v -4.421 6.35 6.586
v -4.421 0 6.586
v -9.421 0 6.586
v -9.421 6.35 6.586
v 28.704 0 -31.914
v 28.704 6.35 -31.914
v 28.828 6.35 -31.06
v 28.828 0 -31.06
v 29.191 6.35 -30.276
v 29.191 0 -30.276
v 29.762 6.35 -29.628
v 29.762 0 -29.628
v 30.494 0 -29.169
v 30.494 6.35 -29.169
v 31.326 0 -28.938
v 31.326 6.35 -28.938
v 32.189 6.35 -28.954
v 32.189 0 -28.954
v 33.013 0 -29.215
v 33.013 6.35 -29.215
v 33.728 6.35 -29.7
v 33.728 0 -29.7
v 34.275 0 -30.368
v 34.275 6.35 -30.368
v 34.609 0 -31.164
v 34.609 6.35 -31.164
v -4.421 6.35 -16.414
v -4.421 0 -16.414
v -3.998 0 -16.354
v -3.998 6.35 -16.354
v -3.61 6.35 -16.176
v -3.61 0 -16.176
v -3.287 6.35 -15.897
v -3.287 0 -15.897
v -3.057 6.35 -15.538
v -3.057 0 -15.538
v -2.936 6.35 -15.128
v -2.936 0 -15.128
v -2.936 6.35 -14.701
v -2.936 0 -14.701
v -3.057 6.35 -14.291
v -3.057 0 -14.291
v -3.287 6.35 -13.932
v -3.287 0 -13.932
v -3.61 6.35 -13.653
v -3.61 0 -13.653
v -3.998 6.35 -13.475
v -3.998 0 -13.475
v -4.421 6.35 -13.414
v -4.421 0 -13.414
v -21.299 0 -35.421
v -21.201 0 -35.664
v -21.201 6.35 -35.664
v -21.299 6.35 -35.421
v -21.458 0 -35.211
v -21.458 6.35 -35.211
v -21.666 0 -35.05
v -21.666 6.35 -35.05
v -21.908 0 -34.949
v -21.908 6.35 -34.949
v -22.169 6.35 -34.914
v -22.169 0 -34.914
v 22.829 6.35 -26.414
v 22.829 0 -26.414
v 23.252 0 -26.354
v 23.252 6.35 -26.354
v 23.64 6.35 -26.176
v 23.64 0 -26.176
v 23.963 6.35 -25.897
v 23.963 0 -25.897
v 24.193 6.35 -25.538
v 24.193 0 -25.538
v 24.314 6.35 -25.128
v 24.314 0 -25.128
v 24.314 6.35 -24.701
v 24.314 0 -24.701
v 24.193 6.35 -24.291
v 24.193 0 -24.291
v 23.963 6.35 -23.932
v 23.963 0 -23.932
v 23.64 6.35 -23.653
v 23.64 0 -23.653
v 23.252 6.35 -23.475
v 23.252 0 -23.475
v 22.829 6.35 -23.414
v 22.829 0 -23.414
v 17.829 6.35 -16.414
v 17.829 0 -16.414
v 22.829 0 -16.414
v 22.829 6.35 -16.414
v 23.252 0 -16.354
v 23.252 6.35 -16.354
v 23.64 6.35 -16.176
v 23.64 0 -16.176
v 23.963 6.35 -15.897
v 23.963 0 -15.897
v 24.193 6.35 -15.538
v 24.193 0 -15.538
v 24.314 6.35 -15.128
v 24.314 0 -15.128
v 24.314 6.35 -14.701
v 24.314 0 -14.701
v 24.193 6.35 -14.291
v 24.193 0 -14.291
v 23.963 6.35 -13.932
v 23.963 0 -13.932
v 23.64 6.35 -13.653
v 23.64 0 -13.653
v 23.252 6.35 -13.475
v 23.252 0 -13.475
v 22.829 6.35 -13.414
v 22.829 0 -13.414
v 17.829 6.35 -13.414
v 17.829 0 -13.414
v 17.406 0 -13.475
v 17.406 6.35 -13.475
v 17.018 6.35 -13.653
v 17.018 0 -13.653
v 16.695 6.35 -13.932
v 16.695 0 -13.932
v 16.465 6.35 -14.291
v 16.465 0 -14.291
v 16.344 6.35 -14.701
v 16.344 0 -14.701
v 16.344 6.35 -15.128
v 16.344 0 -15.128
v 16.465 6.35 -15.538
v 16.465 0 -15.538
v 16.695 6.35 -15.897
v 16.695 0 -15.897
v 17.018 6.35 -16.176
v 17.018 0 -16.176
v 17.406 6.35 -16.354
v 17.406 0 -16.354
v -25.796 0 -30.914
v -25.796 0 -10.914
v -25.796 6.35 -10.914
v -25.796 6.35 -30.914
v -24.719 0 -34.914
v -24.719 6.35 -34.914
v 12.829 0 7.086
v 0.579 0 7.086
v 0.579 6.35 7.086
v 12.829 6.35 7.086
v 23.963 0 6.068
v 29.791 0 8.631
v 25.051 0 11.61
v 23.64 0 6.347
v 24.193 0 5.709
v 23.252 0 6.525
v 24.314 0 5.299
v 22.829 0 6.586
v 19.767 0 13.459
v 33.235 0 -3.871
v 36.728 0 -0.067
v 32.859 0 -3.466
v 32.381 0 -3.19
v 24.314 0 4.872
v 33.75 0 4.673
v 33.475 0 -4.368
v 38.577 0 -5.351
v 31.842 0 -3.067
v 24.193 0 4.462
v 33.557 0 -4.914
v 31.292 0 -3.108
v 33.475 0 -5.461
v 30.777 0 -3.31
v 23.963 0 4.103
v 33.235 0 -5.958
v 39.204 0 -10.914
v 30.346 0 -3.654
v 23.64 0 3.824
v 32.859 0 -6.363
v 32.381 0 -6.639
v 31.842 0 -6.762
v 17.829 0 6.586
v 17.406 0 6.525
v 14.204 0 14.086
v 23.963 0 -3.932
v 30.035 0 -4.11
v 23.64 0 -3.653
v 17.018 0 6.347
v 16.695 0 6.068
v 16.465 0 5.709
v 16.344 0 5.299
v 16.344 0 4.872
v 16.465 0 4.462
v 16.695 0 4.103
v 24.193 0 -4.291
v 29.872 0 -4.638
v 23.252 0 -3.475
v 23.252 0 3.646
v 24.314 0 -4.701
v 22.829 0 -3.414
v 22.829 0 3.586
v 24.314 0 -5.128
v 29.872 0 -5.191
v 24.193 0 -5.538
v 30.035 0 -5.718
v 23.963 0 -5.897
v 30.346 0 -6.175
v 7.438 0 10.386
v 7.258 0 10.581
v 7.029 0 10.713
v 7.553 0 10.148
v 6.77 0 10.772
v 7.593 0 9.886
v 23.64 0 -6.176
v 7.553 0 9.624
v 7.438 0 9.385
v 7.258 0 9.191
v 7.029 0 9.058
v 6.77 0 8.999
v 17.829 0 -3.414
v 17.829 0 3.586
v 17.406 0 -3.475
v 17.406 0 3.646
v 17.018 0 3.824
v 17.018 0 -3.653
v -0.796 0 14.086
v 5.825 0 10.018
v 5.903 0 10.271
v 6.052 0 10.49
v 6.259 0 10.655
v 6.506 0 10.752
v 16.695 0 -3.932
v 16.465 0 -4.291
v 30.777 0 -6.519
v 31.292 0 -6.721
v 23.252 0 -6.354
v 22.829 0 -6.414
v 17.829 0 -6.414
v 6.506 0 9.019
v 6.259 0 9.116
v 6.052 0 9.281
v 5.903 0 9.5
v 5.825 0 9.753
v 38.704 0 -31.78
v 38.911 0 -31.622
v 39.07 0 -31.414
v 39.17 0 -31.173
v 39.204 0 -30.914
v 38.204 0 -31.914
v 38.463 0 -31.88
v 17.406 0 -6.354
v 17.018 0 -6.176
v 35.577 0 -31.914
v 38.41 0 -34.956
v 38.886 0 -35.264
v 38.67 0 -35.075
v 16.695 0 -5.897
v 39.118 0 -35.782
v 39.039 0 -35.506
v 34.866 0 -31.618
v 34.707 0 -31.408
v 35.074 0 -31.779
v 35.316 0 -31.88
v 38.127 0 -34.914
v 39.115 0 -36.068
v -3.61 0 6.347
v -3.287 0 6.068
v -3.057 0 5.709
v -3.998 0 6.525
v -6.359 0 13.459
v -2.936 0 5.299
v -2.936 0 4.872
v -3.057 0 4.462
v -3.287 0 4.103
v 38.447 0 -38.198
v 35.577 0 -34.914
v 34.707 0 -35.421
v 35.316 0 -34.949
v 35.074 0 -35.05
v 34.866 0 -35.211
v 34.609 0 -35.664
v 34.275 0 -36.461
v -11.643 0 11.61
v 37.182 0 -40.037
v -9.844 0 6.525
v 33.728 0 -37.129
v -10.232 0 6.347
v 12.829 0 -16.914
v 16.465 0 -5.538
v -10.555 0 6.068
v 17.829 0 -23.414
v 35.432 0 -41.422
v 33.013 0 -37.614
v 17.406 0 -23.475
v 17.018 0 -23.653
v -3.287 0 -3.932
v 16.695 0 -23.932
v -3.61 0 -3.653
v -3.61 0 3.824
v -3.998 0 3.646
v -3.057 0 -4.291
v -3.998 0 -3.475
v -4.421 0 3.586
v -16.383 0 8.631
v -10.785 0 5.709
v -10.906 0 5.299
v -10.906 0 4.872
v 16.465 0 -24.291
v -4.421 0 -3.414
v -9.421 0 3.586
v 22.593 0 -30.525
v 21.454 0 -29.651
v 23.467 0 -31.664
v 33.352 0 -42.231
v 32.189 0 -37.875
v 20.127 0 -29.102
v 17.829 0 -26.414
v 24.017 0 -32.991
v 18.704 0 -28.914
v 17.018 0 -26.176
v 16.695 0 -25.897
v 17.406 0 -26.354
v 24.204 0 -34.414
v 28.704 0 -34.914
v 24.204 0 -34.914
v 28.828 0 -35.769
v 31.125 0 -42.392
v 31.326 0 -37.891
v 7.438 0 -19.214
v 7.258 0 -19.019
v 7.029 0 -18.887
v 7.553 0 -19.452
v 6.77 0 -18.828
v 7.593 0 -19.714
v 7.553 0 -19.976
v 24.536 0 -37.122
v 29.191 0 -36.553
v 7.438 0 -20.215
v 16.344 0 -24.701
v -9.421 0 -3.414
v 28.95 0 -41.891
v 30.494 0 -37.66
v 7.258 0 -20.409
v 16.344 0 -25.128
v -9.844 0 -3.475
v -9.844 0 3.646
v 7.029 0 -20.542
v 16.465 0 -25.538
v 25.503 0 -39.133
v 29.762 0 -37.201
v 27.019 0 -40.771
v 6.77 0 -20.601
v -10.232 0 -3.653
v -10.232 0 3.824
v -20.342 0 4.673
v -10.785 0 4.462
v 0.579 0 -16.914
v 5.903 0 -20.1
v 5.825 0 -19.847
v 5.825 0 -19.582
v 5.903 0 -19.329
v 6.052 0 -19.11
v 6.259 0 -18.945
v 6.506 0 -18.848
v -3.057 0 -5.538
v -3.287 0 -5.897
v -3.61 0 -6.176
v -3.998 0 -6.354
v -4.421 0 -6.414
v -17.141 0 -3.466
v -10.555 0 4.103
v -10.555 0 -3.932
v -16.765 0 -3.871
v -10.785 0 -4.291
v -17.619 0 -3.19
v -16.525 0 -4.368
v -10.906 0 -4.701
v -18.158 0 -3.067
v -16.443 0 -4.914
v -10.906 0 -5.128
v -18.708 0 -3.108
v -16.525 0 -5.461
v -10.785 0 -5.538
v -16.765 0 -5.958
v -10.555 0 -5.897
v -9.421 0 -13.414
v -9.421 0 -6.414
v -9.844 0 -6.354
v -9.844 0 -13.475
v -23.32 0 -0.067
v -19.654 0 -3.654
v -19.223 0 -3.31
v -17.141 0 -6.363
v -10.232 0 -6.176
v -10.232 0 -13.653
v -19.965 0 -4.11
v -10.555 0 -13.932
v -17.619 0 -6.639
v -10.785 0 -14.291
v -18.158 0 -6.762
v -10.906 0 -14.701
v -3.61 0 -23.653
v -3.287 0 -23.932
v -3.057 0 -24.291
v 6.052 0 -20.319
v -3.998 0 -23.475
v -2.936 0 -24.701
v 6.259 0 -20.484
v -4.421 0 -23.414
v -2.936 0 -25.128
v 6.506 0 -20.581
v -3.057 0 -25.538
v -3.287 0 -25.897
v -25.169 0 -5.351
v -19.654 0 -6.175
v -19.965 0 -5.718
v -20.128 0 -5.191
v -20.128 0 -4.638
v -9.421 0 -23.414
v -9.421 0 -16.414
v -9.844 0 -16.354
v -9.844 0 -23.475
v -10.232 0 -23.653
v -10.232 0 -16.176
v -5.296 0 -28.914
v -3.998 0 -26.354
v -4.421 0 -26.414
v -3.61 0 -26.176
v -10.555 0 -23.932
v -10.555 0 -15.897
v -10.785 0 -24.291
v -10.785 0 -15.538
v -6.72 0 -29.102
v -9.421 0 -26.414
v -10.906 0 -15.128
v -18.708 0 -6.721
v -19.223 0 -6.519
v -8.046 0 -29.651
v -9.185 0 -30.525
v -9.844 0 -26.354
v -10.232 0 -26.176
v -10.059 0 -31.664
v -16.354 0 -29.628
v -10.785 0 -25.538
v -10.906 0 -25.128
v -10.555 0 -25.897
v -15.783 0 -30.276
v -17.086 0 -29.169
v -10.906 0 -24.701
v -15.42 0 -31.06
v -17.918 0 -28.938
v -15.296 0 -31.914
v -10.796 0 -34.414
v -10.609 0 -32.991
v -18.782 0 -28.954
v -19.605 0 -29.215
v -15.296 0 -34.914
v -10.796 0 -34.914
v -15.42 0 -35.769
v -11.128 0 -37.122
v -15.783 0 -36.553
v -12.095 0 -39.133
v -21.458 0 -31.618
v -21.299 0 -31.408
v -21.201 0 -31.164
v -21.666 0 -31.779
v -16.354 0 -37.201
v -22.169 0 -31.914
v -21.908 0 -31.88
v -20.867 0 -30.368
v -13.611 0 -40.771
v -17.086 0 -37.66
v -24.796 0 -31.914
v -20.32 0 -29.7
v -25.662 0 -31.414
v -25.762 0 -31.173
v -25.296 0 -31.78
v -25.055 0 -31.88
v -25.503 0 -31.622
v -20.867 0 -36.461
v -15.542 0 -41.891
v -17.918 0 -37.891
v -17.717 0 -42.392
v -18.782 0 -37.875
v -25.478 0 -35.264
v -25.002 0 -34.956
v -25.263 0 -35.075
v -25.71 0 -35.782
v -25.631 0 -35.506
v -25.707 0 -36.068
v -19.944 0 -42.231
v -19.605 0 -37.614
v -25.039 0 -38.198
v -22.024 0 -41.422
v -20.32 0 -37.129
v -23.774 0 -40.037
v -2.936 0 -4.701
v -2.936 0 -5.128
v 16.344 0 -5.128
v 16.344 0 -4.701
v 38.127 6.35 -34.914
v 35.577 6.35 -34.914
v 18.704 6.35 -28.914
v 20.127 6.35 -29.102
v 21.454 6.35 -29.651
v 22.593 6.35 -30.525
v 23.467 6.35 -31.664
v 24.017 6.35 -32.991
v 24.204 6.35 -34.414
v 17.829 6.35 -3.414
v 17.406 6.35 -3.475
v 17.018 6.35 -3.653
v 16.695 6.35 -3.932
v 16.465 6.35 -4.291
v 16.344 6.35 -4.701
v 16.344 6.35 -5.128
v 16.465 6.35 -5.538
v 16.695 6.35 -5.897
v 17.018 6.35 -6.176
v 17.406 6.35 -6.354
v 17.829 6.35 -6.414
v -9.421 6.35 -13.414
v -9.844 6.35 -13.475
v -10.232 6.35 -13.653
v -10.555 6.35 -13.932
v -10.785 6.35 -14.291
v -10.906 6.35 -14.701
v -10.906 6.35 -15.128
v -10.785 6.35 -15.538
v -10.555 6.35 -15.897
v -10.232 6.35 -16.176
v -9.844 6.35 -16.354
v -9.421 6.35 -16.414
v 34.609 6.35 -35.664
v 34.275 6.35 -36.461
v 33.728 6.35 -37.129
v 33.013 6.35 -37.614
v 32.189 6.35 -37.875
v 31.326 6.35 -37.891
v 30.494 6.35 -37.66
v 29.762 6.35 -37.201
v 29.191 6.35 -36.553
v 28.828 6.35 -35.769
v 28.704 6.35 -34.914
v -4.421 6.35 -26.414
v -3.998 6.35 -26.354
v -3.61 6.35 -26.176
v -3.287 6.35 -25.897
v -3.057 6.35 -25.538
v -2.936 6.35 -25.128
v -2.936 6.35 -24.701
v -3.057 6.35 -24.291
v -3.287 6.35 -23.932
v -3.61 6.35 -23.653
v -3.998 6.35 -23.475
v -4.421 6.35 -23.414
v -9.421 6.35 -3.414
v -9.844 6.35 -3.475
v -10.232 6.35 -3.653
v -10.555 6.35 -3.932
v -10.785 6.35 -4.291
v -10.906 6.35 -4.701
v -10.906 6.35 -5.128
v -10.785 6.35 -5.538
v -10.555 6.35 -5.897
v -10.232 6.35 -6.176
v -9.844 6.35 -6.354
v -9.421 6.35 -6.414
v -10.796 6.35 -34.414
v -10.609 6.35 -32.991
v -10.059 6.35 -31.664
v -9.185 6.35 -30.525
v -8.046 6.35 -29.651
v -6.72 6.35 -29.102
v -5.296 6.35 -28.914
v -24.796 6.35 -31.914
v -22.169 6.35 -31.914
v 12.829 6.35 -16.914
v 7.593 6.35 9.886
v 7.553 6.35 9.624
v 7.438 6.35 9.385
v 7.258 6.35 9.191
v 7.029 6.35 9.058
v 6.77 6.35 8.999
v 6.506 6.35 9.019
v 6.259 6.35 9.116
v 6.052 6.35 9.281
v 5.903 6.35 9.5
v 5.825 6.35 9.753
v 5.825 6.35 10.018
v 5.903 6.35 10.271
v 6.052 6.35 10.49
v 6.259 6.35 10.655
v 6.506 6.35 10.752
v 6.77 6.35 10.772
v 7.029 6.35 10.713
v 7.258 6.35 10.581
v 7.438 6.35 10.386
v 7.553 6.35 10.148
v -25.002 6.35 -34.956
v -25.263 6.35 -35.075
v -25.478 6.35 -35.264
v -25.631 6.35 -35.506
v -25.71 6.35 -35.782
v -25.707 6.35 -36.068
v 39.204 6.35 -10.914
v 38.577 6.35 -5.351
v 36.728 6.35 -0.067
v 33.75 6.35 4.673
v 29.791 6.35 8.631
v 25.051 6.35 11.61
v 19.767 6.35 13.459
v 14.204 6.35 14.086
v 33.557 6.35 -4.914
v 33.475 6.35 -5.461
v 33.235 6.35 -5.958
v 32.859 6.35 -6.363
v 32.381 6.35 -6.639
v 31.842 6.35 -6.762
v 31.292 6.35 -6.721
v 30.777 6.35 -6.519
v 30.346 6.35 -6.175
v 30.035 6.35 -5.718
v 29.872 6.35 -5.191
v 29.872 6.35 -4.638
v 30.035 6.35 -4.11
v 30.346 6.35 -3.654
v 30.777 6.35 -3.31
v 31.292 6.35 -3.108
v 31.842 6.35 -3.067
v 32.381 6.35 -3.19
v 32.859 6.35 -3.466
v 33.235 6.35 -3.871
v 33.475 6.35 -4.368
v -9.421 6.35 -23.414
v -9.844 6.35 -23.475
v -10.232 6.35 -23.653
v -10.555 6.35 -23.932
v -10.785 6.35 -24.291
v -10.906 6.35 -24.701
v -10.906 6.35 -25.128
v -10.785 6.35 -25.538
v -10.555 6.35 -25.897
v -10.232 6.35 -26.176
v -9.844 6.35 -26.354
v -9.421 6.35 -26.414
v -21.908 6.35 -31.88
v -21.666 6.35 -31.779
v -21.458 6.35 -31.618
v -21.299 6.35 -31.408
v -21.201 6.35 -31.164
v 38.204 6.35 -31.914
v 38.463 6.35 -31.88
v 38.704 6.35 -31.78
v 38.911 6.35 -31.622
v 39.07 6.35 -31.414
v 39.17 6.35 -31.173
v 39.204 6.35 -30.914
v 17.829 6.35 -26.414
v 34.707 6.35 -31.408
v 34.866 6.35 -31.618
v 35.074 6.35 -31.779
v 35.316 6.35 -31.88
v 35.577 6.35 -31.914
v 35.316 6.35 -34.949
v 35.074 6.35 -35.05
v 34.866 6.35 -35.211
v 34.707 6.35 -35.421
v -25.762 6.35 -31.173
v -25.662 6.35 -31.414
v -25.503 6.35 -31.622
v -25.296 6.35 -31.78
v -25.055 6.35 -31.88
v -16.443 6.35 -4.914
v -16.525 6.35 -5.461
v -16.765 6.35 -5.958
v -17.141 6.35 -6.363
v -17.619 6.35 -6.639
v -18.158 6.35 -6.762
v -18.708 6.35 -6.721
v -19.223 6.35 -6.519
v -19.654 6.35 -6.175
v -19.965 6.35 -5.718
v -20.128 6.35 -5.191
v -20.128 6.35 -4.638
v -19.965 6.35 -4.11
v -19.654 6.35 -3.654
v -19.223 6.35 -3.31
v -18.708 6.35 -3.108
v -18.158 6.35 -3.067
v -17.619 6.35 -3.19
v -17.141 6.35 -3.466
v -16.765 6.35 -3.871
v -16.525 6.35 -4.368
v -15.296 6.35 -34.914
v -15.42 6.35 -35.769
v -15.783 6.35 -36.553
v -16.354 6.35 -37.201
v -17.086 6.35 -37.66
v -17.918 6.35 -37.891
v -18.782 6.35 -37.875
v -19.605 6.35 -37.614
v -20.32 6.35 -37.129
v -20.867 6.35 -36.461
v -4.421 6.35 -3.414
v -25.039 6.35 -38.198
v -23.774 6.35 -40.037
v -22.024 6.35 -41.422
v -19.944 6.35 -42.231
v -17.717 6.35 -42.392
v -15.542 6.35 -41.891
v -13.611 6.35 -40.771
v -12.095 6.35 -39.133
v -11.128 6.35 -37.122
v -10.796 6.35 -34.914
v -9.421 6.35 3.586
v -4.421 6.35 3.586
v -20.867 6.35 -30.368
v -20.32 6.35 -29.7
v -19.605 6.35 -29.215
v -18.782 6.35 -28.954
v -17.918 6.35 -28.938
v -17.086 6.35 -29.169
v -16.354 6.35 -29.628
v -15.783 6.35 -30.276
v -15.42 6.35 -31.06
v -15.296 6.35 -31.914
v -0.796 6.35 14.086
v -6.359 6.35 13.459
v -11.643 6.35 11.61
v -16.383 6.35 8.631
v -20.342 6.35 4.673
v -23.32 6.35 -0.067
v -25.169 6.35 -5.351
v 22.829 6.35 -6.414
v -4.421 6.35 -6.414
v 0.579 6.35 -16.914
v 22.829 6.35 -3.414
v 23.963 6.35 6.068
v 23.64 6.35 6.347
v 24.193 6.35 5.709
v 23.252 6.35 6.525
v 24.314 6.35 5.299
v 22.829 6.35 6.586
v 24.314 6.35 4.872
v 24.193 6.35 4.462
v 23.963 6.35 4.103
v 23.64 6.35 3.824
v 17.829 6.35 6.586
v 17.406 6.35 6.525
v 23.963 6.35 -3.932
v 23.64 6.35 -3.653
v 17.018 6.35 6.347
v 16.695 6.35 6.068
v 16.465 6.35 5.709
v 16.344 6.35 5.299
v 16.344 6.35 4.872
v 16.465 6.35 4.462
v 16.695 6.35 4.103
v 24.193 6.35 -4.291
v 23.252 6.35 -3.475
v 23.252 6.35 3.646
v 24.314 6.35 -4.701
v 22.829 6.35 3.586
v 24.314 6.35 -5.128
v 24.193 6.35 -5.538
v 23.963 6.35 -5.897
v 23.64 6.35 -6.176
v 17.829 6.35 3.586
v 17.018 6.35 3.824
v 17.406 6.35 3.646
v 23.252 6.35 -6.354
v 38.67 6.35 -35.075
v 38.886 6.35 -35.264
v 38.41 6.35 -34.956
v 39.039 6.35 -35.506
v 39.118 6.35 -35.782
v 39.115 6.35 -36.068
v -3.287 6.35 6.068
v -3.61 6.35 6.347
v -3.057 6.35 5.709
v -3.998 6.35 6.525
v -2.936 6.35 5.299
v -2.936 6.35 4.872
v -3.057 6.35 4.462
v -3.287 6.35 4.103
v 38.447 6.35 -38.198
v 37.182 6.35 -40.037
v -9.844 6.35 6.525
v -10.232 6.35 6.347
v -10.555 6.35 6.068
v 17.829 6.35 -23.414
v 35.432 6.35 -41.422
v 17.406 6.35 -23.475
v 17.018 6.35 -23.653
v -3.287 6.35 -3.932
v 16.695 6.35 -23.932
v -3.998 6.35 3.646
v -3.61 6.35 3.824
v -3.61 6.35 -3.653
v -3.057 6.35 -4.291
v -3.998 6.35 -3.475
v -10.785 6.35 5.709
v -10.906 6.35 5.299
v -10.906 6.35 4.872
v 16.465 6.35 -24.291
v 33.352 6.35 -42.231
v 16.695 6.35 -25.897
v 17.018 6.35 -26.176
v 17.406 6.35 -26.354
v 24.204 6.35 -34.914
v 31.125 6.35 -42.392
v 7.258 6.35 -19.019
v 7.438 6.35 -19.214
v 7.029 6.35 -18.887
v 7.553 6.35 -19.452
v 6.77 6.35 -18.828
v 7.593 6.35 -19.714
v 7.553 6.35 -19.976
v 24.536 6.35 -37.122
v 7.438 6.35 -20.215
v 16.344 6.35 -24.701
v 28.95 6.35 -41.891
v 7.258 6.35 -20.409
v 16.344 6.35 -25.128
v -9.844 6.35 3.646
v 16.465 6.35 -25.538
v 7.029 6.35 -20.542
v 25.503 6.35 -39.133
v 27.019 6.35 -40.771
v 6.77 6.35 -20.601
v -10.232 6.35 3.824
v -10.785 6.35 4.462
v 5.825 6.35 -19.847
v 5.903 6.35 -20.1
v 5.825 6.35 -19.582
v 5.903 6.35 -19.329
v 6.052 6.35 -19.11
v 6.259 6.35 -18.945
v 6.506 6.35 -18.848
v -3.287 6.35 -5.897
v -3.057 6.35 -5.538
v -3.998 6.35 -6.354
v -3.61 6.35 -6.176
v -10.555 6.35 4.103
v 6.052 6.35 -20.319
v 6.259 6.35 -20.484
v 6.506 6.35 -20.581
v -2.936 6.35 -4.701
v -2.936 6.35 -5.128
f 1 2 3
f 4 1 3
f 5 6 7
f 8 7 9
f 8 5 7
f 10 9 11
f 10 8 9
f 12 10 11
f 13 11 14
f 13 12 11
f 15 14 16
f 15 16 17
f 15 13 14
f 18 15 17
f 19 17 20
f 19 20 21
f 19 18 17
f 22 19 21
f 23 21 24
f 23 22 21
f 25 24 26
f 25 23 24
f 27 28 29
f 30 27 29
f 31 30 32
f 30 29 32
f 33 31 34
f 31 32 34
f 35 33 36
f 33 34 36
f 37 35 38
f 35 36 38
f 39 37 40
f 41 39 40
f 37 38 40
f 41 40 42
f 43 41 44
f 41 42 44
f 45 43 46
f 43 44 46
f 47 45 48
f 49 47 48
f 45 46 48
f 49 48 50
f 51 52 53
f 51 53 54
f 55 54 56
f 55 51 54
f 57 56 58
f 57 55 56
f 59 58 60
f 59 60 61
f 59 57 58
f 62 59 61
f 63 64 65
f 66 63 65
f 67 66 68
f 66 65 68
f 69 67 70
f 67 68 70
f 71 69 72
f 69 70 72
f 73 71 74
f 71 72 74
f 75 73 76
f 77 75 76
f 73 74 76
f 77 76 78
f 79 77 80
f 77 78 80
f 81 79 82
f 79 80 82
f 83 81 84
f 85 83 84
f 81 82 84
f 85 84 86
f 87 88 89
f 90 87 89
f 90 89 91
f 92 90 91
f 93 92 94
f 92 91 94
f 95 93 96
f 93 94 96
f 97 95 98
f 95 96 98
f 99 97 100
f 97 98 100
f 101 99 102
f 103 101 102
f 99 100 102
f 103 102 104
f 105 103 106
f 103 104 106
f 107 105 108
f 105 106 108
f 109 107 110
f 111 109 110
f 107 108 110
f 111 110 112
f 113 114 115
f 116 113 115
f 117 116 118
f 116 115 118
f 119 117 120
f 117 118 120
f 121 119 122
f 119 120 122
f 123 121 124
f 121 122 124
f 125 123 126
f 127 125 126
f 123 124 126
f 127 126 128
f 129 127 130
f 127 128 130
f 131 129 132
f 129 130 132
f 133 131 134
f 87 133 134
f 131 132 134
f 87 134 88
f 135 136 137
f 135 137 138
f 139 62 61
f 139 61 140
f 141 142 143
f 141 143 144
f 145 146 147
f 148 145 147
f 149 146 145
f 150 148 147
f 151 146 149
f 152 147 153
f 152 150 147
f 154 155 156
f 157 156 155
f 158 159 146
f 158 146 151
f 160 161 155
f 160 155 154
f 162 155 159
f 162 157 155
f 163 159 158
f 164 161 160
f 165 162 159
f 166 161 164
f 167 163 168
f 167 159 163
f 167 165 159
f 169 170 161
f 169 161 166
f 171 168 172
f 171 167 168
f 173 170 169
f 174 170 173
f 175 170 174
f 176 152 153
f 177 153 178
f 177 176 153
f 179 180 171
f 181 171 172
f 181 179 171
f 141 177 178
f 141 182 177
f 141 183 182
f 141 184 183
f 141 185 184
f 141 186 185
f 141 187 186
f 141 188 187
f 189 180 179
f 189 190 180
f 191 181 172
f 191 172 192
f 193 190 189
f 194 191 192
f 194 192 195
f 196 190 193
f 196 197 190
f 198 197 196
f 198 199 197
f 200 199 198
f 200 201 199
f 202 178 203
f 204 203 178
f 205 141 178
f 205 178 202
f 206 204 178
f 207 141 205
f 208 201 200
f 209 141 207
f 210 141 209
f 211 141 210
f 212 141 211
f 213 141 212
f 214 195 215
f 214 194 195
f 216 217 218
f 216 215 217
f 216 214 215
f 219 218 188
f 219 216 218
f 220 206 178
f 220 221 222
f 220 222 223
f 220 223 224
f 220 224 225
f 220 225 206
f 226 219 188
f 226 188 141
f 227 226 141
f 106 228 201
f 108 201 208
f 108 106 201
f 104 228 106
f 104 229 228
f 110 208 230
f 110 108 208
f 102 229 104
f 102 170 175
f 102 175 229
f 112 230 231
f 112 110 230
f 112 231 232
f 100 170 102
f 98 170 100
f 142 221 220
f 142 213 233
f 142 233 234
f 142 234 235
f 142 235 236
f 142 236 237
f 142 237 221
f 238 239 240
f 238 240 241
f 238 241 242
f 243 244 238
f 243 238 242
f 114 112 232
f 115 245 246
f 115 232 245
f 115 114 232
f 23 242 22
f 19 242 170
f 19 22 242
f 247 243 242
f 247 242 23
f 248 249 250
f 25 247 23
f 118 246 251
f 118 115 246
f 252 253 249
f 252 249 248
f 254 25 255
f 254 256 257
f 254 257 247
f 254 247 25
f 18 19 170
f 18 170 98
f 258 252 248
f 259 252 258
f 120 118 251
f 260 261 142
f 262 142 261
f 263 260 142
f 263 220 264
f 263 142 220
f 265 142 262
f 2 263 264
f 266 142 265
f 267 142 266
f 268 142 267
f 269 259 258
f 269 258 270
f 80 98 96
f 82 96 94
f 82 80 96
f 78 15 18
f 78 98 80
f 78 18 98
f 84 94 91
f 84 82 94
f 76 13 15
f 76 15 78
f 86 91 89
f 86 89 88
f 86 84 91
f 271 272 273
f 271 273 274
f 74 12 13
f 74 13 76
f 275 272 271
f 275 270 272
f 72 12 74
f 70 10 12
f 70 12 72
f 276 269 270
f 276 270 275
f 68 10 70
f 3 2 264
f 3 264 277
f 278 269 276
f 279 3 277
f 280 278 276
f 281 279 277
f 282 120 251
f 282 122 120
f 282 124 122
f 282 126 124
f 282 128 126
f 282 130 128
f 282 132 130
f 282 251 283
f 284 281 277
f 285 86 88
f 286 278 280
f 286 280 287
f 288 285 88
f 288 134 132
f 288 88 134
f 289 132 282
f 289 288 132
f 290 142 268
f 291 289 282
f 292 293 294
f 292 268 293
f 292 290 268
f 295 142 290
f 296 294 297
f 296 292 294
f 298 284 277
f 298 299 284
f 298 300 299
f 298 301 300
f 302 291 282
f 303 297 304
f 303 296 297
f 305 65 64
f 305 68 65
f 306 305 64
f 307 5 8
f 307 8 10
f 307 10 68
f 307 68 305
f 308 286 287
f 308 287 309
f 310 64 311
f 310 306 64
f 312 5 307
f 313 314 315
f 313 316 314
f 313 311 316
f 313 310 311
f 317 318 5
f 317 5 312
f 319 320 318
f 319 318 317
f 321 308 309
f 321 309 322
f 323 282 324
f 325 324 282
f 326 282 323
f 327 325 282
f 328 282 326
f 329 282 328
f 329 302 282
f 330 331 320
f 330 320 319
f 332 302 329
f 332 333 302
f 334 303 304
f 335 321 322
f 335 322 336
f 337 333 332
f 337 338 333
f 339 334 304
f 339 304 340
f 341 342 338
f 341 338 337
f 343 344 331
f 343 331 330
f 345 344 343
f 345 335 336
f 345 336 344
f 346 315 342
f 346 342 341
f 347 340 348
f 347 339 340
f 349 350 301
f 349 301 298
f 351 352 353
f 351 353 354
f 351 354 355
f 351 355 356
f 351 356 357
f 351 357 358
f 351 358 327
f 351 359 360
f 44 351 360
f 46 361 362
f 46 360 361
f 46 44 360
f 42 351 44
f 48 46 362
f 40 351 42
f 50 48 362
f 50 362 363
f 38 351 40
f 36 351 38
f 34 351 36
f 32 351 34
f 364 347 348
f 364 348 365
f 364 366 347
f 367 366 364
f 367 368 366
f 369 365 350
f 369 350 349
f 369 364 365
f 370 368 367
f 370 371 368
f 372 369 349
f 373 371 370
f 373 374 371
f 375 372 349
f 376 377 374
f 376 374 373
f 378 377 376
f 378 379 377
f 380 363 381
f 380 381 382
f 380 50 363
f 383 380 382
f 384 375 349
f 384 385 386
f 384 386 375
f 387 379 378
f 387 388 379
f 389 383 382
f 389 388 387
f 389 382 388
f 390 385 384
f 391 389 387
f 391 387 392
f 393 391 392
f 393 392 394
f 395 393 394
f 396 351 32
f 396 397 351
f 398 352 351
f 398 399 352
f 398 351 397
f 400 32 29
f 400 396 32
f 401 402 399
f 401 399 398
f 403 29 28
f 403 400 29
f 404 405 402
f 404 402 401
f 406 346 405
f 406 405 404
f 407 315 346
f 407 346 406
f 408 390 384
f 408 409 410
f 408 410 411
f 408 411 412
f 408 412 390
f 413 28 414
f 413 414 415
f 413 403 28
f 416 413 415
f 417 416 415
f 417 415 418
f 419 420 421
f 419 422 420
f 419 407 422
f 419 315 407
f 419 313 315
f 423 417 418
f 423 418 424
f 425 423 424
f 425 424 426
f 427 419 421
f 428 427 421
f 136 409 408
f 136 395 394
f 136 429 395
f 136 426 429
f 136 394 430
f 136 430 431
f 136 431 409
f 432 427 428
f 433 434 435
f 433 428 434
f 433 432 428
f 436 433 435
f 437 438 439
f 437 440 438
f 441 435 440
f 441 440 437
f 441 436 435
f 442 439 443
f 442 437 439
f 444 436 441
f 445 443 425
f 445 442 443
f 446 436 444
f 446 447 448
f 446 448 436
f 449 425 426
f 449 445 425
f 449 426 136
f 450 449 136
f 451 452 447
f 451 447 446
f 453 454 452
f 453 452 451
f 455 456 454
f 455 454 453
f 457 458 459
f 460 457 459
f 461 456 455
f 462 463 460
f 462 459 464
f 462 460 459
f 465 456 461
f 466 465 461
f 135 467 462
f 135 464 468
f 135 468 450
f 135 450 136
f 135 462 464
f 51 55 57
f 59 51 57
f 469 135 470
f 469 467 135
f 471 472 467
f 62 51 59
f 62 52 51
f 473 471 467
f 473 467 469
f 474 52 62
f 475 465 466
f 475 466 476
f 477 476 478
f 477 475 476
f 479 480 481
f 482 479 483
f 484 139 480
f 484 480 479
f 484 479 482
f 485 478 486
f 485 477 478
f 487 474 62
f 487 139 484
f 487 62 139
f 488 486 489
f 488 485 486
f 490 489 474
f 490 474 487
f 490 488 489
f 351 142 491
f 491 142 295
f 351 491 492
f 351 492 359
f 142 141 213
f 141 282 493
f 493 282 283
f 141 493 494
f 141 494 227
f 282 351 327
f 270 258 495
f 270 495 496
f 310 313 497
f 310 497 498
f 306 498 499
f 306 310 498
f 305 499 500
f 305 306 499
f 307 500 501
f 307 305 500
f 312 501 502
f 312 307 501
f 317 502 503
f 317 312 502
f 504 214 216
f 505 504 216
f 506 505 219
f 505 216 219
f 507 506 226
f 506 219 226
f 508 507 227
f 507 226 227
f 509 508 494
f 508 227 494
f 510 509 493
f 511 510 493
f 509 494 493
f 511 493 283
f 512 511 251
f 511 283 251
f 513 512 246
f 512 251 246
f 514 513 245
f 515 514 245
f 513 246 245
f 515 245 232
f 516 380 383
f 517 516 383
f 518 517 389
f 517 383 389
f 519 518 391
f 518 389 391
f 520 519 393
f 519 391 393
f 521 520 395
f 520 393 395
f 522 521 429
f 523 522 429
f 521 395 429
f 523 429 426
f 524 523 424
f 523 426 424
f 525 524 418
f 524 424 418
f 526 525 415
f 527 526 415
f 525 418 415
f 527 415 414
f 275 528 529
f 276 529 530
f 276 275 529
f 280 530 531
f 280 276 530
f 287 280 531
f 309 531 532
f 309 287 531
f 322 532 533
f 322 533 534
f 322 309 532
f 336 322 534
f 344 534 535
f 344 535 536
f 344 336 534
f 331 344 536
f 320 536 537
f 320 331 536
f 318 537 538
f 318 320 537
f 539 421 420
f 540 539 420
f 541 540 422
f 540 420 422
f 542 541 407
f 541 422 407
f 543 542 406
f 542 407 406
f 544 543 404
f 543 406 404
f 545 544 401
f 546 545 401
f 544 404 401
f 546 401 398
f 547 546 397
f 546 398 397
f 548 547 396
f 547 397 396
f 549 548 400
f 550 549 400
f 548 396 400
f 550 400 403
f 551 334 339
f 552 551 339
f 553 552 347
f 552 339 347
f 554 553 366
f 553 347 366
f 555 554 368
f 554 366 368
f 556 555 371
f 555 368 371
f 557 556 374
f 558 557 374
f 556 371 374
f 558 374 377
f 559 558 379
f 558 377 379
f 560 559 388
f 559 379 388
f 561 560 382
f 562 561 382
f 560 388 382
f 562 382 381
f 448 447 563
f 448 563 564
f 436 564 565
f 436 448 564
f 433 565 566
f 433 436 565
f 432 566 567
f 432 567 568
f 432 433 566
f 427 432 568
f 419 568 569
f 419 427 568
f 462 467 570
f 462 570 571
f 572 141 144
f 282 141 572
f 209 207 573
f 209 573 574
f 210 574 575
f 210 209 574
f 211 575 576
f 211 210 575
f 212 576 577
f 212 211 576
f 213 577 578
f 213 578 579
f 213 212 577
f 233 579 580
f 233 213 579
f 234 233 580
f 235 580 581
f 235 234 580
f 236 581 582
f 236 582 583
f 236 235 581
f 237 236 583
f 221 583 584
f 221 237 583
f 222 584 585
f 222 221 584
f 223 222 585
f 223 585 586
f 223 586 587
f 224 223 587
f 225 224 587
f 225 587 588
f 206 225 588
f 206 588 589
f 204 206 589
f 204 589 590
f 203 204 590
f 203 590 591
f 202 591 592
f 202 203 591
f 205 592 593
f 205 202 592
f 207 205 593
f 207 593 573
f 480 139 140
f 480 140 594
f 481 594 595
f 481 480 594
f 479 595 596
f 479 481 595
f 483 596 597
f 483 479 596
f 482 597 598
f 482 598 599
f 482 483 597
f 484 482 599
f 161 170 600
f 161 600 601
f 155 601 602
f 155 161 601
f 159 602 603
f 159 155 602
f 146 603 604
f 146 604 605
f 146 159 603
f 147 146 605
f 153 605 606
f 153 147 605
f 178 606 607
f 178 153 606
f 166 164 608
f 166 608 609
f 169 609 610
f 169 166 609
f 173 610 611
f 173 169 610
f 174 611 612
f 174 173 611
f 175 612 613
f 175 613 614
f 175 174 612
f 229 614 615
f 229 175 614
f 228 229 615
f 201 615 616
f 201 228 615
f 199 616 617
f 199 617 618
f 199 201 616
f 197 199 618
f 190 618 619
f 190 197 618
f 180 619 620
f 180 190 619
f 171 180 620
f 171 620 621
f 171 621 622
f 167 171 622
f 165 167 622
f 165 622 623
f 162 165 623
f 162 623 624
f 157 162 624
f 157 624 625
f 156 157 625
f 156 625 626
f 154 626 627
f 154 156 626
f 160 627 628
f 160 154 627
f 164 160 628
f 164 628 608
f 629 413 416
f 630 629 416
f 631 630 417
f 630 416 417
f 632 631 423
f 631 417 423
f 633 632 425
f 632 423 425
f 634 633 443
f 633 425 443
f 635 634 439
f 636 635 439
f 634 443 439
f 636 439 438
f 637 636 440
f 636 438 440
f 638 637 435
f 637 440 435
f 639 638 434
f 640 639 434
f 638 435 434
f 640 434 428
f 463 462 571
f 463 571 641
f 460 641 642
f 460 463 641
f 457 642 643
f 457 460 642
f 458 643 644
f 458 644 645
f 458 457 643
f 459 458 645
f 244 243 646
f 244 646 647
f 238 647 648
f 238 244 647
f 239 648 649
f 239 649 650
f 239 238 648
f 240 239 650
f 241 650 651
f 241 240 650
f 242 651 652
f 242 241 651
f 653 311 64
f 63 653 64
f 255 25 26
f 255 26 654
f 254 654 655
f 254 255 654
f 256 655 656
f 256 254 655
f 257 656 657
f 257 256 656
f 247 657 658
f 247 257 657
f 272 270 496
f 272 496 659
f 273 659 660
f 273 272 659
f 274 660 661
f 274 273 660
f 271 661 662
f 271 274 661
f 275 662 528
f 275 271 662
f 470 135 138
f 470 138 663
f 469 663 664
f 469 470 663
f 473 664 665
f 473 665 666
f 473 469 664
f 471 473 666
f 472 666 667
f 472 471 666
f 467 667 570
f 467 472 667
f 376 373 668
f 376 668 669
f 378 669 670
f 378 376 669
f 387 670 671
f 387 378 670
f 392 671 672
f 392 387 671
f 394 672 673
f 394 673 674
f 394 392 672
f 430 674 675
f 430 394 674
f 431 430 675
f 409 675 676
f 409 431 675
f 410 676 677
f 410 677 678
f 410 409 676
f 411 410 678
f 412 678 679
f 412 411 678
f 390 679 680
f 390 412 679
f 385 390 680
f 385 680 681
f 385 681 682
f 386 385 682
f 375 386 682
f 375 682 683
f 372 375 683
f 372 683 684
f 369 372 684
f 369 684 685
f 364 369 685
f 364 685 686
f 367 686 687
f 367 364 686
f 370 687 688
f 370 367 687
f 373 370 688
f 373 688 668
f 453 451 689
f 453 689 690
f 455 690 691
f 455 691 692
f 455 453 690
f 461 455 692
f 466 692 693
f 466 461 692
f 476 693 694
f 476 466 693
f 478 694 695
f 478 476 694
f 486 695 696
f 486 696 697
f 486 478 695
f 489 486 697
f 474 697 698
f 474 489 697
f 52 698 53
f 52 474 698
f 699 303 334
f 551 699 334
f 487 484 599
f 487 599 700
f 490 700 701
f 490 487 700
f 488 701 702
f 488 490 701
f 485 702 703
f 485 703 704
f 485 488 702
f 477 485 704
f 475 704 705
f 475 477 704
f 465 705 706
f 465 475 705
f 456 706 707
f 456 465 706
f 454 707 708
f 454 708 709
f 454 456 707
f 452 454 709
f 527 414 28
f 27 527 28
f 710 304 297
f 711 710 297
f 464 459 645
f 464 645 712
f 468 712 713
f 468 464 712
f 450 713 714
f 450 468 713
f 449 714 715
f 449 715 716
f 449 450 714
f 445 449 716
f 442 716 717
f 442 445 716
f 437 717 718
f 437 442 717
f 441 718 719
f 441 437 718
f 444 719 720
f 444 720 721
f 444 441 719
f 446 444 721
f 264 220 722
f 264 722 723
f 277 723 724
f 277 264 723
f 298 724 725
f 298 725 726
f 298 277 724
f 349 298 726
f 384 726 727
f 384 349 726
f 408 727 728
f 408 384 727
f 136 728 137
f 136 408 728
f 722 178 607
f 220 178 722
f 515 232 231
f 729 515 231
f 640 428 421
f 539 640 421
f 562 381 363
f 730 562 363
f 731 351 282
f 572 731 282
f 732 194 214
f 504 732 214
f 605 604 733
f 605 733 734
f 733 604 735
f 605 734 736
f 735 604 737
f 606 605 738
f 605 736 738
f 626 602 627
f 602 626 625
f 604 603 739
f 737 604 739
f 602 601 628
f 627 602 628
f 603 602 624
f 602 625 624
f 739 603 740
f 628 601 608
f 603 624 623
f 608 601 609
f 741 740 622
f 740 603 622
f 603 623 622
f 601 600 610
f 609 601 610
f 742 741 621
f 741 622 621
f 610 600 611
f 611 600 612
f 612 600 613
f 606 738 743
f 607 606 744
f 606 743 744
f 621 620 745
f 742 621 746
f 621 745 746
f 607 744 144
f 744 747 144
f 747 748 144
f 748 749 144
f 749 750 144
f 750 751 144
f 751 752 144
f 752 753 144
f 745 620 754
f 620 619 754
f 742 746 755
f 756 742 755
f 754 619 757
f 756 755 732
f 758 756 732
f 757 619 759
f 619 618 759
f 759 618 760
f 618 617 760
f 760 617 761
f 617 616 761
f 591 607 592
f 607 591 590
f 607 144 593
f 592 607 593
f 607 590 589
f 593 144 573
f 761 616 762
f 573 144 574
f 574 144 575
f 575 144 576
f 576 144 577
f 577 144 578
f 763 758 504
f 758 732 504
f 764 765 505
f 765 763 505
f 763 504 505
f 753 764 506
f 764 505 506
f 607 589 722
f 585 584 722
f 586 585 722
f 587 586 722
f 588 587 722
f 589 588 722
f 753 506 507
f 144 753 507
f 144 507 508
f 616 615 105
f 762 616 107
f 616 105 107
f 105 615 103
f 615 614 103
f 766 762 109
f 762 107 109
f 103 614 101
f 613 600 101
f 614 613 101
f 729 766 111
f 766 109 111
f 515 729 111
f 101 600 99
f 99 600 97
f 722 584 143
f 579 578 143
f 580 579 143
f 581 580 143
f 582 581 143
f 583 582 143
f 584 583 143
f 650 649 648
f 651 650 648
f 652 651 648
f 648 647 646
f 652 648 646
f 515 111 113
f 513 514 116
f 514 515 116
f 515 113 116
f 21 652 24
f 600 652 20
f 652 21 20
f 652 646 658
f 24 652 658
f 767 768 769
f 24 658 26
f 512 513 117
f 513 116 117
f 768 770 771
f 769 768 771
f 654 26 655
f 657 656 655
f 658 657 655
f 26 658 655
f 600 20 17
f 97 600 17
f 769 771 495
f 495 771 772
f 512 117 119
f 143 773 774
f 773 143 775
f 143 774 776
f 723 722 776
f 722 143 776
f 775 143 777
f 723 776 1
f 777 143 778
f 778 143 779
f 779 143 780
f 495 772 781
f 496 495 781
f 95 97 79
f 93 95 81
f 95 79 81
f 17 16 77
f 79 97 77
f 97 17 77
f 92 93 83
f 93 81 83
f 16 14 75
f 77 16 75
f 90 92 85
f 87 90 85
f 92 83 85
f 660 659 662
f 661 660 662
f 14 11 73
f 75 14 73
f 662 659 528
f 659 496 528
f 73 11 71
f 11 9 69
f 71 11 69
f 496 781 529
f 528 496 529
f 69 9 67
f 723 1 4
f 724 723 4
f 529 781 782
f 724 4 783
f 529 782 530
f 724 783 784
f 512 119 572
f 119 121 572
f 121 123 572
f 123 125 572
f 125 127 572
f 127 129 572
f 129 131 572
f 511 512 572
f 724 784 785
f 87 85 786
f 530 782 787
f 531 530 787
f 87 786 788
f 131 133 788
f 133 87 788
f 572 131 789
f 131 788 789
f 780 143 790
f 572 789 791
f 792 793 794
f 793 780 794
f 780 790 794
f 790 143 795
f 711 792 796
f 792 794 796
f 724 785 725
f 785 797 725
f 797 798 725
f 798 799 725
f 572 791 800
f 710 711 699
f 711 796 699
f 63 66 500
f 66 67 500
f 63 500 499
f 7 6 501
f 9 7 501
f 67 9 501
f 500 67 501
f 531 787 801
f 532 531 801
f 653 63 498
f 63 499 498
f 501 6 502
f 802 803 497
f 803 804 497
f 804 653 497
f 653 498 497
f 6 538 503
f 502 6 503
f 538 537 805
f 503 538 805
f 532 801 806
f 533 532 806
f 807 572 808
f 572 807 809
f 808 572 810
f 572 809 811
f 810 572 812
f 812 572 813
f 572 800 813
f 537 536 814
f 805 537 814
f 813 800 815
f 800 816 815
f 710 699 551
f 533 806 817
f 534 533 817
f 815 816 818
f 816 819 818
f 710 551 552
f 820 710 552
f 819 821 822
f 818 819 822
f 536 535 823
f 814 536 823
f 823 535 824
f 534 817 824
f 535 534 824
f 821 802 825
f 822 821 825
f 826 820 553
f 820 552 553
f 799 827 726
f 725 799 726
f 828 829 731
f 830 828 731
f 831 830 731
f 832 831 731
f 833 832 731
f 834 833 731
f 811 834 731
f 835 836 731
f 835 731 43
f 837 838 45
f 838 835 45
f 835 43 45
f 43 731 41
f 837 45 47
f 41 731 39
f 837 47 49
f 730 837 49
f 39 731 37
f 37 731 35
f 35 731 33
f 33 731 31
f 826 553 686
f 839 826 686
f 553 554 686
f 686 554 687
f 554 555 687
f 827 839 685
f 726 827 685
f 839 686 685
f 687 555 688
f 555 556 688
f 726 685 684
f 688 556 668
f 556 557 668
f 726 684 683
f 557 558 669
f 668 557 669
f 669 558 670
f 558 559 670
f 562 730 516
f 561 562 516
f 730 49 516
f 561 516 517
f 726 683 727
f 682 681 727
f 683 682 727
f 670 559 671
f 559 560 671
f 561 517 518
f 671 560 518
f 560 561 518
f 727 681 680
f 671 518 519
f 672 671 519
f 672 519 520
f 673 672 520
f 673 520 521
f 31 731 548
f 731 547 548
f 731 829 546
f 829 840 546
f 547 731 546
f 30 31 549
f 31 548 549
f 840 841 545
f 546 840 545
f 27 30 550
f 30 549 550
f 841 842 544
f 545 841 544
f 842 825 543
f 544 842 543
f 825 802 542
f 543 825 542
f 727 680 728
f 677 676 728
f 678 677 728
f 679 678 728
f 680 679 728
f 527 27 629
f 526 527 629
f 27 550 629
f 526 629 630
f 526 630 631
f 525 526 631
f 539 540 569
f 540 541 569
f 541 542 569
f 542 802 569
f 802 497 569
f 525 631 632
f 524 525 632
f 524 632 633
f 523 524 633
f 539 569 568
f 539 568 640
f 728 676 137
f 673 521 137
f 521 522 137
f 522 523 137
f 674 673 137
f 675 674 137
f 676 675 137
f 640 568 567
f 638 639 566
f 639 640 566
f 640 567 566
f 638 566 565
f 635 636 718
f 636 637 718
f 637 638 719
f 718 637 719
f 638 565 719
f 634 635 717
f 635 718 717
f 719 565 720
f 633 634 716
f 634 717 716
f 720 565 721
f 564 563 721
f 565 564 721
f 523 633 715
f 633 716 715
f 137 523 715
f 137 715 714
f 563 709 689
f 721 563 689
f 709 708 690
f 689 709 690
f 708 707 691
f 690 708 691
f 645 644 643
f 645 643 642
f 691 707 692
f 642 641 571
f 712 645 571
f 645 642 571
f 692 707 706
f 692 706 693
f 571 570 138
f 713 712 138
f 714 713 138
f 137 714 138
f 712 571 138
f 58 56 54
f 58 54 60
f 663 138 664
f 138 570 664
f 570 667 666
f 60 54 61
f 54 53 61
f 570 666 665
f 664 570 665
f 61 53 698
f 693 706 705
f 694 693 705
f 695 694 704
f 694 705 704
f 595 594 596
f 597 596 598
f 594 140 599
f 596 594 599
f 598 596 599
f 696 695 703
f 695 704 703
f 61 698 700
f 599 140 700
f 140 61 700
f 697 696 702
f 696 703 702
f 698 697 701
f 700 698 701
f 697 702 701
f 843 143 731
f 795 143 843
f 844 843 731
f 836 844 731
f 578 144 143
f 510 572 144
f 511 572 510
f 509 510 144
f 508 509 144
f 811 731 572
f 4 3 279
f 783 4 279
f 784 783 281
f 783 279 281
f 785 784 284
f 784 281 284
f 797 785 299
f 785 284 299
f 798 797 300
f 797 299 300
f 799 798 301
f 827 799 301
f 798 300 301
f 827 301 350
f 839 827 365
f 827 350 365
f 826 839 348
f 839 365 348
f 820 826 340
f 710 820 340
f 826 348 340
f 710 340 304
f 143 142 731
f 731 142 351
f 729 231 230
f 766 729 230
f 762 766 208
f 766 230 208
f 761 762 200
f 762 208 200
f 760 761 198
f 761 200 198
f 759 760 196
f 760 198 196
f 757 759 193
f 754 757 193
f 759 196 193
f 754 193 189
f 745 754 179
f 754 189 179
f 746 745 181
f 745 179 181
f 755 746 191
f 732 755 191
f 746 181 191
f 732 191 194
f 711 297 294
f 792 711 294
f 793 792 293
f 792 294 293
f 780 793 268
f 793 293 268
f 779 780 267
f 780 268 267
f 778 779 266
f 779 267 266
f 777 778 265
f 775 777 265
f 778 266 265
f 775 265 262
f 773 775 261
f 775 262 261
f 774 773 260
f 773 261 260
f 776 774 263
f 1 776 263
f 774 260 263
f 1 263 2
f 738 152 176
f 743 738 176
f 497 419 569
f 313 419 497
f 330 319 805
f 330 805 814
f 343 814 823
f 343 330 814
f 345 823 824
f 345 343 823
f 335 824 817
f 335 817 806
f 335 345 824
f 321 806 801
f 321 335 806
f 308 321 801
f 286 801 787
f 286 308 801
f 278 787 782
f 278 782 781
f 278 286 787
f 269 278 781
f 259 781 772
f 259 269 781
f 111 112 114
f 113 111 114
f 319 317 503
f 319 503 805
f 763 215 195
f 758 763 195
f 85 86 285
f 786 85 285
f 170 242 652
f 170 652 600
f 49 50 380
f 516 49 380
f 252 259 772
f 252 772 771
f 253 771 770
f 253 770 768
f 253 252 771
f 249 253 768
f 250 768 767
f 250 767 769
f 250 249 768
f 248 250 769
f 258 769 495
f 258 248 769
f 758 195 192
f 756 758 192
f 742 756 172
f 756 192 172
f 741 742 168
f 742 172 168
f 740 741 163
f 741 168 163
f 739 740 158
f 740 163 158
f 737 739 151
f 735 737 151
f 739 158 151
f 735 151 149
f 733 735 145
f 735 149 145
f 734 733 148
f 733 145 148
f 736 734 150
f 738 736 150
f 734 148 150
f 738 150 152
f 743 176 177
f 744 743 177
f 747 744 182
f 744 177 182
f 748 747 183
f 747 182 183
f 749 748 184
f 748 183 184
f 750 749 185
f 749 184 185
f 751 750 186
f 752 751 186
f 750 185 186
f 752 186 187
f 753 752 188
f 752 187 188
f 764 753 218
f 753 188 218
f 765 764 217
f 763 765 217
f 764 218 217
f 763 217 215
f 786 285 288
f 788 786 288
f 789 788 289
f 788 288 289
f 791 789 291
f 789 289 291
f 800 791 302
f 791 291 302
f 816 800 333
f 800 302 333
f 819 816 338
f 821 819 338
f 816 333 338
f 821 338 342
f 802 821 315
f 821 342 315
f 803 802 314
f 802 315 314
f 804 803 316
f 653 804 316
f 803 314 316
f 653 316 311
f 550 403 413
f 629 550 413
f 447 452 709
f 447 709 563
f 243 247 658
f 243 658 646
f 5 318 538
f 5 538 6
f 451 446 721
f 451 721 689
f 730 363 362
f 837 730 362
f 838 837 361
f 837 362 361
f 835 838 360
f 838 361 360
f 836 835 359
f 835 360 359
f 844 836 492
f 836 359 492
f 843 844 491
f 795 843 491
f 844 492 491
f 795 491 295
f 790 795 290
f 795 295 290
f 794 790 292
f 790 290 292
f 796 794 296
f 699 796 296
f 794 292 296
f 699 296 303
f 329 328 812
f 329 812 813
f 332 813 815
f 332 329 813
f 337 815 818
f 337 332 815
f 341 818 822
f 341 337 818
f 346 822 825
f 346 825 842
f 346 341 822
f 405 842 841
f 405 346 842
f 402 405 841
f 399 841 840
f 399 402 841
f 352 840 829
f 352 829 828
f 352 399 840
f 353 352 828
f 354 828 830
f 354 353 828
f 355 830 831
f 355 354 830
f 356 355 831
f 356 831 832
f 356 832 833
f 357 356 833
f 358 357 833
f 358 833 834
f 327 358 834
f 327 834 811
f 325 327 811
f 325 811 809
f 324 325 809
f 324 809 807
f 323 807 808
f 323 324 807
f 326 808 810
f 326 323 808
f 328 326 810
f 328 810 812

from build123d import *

# Parameters (mm, degrees)
SKETCH1_R           = 0.889
SKETCH1_R_2         = 1.85293
SKETCH1_W           = 12.25
SKETCH1_H           = 24
BOSS_EXTRUDE1_DEPTH = 6.35


with BuildPart() as part:
    # Sketch1 → Boss-Extrude1 (new body)
    with BuildSketch(Plane(origin=(0, 0, 0), x_dir=(1, 0, 0), z_dir=(0, 1, 0))):
        with BuildLine():
            Line((-25.79604899, 10.914446368), (-25.79604899, 28.914446368))
            Line((-25.79604899, 28.914446368), (-25.79604899, 30.914446368))
            ThreePointArc((-25.79604899, 30.914446368), (-25.503155771, 31.621553149), (-24.79604899, 31.914446368))
            Line((-24.79604899, 31.914446368), (-22.169032336, 31.914446368))
            ThreePointArc((-22.169032336, 31.914446368), (-21.5566599, 31.705015783), (-21.200786499, 31.164446368))
            ThreePointArc((-21.200786499, 31.164446368), (-17.918036112, 28.938357279), (-15.29604899, 31.914446368))
            Line((-15.29604899, 31.914446368), (-15.29604899, 34.914446368))
            ThreePointArc((-15.29604899, 34.914446368), (-17.918036112, 37.890535457), (-21.200786499, 35.664446368))
            ThreePointArc((-21.200786499, 35.664446368), (-21.5566599, 35.123876953), (-22.169032336, 34.914446368))
            Line((-22.169032336, 34.914446368), (-24.718665279, 34.914446368))
            ThreePointArc((-24.718665279, 34.914446368), (-25.478219804, 35.264002732), (-25.706760093, 36.068292522))
            ThreePointArc((-25.706760093, 36.068292522), (-17.717401115, 42.392090826), (-10.79604899, 34.914446368))
            Line((-10.79604899, 34.914446368), (-10.79604899, 34.414446368))
            ThreePointArc((-10.79604899, 34.414446368), (-9.185136286, 30.525359071), (-5.29604899, 28.914446368))
            Line((-5.29604899, 28.914446368), (18.70395101, 28.914446368))
            ThreePointArc((18.70395101, 28.914446368), (22.593038307, 30.525359071), (24.20395101, 34.414446368))
            Line((24.20395101, 34.414446368), (24.20395101, 34.914446368))
            ThreePointArc((24.20395101, 34.914446368), (31.125303135, 42.392090826), (39.114662113, 36.068292522))
            ThreePointArc((39.114662113, 36.068292522), (38.886121825, 35.264002732), (38.126567299, 34.914446368))
            Line((38.126567299, 34.914446368), (35.576934356, 34.914446368))
            ThreePointArc((35.576934356, 34.914446368), (34.964561921, 35.123876953), (34.60868852, 35.664446368))
            ThreePointArc((34.60868852, 35.664446368), (31.325938133, 37.890535457), (28.70395101, 34.914446368))
            Line((28.70395101, 34.914446368), (28.70395101, 31.914446368))
            ThreePointArc((28.70395101, 31.914446368), (31.325938133, 28.938357279), (34.60868852, 31.164446368))
            ThreePointArc((34.60868852, 31.164446368), (34.964561921, 31.705015783), (35.576934356, 31.914446368))
            Line((35.576934356, 31.914446368), (38.20395101, 31.914446368))
            ThreePointArc((38.20395101, 31.914446368), (38.911057791, 31.621553149), (39.20395101, 30.914446368))
            Line((39.20395101, 30.914446368), (39.20395101, 28.914446368))
            Line((39.20395101, 28.914446368), (39.20395101, 10.914446368))
            ThreePointArc((39.20395101, 10.914446368), (31.88162054, -6.763223162), (14.20395101, -14.085553632))
            Line((14.20395101, -14.085553632), (-0.79604899, -14.085553632))
            ThreePointArc((-0.79604899, -14.085553632), (-18.47371852, -6.763223162), (-25.79604899, 10.914446368))
        make_face()
        with Locations((6.70395101, 19.714446368)):
            Circle(SKETCH1_R, mode=Mode.SUBTRACT)
        with Locations((6.70395101, -9.885553632)):
            Circle(SKETCH1_R, mode=Mode.SUBTRACT)
        with Locations((-18.29604899, 4.914446368)):
            Circle(SKETCH1_R_2, mode=Mode.SUBTRACT)
        with Locations((31.70395101, 4.914446368)):
            Circle(SKETCH1_R_2, mode=Mode.SUBTRACT)
        with Locations((6.70395101, 4.914446368)):
            Rectangle(SKETCH1_W, SKETCH1_H, mode=Mode.SUBTRACT)
        with BuildLine():
            Line((-9.42104899, 6.414446368), (-4.42104899, 6.414446368))
            ThreePointArc((-4.42104899, 6.414446368), (-2.92104899, 4.914446368), (-4.42104899, 3.414446368))
            Line((-4.42104899, 3.414446368), (-9.42104899, 3.414446368))
            ThreePointArc((-9.42104899, 3.414446368), (-10.92104899, 4.914446368), (-9.42104899, 6.414446368))
        make_face(mode=Mode.SUBTRACT)
        with BuildLine():
            Line((22.82895101, 3.414446368), (17.82895101, 3.414446368))
            ThreePointArc((17.82895101, 3.414446368), (16.32895101, 4.914446368), (17.82895101, 6.414446368))
            Line((17.82895101, 6.414446368), (22.82895101, 6.414446368))
            ThreePointArc((22.82895101, 6.414446368), (24.32895101, 4.914446368), (22.82895101, 3.414446368))
        make_face(mode=Mode.SUBTRACT)
        with BuildLine():
            Line((-9.42104899, -3.585553632), (-4.42104899, -3.585553632))
            ThreePointArc((-4.42104899, -3.585553632), (-2.92104899, -5.085553632), (-4.42104899, -6.585553632))
            Line((-4.42104899, -6.585553632), (-9.42104899, -6.585553632))
            ThreePointArc((-9.42104899, -6.585553632), (-10.92104899, -5.085553632), (-9.42104899, -3.585553632))
        make_face(mode=Mode.SUBTRACT)
        with BuildLine():
            Line((22.82895101, -6.585553632), (17.82895101, -6.585553632))
            ThreePointArc((17.82895101, -6.585553632), (16.32895101, -5.085553632), (17.82895101, -3.585553632))
            Line((17.82895101, -3.585553632), (22.82895101, -3.585553632))
            ThreePointArc((22.82895101, -3.585553632), (24.32895101, -5.085553632), (22.82895101, -6.585553632))
        make_face(mode=Mode.SUBTRACT)
        with BuildLine():
            Line((-9.42104899, 16.414446368), (-4.42104899, 16.414446368))
            ThreePointArc((-4.42104899, 16.414446368), (-2.92104899, 14.914446368), (-4.42104899, 13.414446368))
            Line((-4.42104899, 13.414446368), (-9.42104899, 13.414446368))
            ThreePointArc((-9.42104899, 13.414446368), (-10.92104899, 14.914446368), (-9.42104899, 16.414446368))
        make_face(mode=Mode.SUBTRACT)
        with BuildLine():
            Line((22.82895101, 13.414446368), (17.82895101, 13.414446368))
            ThreePointArc((17.82895101, 13.414446368), (16.32895101, 14.914446368), (17.82895101, 16.414446368))
            Line((17.82895101, 16.414446368), (22.82895101, 16.414446368))
            ThreePointArc((22.82895101, 16.414446368), (24.32895101, 14.914446368), (22.82895101, 13.414446368))
        make_face(mode=Mode.SUBTRACT)
        with BuildLine():
            Line((-9.42104899, 26.414446368), (-4.42104899, 26.414446368))
            ThreePointArc((-4.42104899, 26.414446368), (-2.92104899, 24.914446368), (-4.42104899, 23.414446368))
            Line((-4.42104899, 23.414446368), (-9.42104899, 23.414446368))
            ThreePointArc((-9.42104899, 23.414446368), (-10.92104899, 24.914446368), (-9.42104899, 26.414446368))
        make_face(mode=Mode.SUBTRACT)
        with BuildLine():
            Line((22.82895101, 23.414446368), (17.82895101, 23.414446368))
            ThreePointArc((17.82895101, 23.414446368), (16.32895101, 24.914446368), (17.82895101, 26.414446368))
            Line((17.82895101, 26.414446368), (22.82895101, 26.414446368))
            ThreePointArc((22.82895101, 26.414446368), (24.32895101, 24.914446368), (22.82895101, 23.414446368))
        make_face(mode=Mode.SUBTRACT)
    extrude(amount=BOSS_EXTRUDE1_DEPTH)


solid = part.part
